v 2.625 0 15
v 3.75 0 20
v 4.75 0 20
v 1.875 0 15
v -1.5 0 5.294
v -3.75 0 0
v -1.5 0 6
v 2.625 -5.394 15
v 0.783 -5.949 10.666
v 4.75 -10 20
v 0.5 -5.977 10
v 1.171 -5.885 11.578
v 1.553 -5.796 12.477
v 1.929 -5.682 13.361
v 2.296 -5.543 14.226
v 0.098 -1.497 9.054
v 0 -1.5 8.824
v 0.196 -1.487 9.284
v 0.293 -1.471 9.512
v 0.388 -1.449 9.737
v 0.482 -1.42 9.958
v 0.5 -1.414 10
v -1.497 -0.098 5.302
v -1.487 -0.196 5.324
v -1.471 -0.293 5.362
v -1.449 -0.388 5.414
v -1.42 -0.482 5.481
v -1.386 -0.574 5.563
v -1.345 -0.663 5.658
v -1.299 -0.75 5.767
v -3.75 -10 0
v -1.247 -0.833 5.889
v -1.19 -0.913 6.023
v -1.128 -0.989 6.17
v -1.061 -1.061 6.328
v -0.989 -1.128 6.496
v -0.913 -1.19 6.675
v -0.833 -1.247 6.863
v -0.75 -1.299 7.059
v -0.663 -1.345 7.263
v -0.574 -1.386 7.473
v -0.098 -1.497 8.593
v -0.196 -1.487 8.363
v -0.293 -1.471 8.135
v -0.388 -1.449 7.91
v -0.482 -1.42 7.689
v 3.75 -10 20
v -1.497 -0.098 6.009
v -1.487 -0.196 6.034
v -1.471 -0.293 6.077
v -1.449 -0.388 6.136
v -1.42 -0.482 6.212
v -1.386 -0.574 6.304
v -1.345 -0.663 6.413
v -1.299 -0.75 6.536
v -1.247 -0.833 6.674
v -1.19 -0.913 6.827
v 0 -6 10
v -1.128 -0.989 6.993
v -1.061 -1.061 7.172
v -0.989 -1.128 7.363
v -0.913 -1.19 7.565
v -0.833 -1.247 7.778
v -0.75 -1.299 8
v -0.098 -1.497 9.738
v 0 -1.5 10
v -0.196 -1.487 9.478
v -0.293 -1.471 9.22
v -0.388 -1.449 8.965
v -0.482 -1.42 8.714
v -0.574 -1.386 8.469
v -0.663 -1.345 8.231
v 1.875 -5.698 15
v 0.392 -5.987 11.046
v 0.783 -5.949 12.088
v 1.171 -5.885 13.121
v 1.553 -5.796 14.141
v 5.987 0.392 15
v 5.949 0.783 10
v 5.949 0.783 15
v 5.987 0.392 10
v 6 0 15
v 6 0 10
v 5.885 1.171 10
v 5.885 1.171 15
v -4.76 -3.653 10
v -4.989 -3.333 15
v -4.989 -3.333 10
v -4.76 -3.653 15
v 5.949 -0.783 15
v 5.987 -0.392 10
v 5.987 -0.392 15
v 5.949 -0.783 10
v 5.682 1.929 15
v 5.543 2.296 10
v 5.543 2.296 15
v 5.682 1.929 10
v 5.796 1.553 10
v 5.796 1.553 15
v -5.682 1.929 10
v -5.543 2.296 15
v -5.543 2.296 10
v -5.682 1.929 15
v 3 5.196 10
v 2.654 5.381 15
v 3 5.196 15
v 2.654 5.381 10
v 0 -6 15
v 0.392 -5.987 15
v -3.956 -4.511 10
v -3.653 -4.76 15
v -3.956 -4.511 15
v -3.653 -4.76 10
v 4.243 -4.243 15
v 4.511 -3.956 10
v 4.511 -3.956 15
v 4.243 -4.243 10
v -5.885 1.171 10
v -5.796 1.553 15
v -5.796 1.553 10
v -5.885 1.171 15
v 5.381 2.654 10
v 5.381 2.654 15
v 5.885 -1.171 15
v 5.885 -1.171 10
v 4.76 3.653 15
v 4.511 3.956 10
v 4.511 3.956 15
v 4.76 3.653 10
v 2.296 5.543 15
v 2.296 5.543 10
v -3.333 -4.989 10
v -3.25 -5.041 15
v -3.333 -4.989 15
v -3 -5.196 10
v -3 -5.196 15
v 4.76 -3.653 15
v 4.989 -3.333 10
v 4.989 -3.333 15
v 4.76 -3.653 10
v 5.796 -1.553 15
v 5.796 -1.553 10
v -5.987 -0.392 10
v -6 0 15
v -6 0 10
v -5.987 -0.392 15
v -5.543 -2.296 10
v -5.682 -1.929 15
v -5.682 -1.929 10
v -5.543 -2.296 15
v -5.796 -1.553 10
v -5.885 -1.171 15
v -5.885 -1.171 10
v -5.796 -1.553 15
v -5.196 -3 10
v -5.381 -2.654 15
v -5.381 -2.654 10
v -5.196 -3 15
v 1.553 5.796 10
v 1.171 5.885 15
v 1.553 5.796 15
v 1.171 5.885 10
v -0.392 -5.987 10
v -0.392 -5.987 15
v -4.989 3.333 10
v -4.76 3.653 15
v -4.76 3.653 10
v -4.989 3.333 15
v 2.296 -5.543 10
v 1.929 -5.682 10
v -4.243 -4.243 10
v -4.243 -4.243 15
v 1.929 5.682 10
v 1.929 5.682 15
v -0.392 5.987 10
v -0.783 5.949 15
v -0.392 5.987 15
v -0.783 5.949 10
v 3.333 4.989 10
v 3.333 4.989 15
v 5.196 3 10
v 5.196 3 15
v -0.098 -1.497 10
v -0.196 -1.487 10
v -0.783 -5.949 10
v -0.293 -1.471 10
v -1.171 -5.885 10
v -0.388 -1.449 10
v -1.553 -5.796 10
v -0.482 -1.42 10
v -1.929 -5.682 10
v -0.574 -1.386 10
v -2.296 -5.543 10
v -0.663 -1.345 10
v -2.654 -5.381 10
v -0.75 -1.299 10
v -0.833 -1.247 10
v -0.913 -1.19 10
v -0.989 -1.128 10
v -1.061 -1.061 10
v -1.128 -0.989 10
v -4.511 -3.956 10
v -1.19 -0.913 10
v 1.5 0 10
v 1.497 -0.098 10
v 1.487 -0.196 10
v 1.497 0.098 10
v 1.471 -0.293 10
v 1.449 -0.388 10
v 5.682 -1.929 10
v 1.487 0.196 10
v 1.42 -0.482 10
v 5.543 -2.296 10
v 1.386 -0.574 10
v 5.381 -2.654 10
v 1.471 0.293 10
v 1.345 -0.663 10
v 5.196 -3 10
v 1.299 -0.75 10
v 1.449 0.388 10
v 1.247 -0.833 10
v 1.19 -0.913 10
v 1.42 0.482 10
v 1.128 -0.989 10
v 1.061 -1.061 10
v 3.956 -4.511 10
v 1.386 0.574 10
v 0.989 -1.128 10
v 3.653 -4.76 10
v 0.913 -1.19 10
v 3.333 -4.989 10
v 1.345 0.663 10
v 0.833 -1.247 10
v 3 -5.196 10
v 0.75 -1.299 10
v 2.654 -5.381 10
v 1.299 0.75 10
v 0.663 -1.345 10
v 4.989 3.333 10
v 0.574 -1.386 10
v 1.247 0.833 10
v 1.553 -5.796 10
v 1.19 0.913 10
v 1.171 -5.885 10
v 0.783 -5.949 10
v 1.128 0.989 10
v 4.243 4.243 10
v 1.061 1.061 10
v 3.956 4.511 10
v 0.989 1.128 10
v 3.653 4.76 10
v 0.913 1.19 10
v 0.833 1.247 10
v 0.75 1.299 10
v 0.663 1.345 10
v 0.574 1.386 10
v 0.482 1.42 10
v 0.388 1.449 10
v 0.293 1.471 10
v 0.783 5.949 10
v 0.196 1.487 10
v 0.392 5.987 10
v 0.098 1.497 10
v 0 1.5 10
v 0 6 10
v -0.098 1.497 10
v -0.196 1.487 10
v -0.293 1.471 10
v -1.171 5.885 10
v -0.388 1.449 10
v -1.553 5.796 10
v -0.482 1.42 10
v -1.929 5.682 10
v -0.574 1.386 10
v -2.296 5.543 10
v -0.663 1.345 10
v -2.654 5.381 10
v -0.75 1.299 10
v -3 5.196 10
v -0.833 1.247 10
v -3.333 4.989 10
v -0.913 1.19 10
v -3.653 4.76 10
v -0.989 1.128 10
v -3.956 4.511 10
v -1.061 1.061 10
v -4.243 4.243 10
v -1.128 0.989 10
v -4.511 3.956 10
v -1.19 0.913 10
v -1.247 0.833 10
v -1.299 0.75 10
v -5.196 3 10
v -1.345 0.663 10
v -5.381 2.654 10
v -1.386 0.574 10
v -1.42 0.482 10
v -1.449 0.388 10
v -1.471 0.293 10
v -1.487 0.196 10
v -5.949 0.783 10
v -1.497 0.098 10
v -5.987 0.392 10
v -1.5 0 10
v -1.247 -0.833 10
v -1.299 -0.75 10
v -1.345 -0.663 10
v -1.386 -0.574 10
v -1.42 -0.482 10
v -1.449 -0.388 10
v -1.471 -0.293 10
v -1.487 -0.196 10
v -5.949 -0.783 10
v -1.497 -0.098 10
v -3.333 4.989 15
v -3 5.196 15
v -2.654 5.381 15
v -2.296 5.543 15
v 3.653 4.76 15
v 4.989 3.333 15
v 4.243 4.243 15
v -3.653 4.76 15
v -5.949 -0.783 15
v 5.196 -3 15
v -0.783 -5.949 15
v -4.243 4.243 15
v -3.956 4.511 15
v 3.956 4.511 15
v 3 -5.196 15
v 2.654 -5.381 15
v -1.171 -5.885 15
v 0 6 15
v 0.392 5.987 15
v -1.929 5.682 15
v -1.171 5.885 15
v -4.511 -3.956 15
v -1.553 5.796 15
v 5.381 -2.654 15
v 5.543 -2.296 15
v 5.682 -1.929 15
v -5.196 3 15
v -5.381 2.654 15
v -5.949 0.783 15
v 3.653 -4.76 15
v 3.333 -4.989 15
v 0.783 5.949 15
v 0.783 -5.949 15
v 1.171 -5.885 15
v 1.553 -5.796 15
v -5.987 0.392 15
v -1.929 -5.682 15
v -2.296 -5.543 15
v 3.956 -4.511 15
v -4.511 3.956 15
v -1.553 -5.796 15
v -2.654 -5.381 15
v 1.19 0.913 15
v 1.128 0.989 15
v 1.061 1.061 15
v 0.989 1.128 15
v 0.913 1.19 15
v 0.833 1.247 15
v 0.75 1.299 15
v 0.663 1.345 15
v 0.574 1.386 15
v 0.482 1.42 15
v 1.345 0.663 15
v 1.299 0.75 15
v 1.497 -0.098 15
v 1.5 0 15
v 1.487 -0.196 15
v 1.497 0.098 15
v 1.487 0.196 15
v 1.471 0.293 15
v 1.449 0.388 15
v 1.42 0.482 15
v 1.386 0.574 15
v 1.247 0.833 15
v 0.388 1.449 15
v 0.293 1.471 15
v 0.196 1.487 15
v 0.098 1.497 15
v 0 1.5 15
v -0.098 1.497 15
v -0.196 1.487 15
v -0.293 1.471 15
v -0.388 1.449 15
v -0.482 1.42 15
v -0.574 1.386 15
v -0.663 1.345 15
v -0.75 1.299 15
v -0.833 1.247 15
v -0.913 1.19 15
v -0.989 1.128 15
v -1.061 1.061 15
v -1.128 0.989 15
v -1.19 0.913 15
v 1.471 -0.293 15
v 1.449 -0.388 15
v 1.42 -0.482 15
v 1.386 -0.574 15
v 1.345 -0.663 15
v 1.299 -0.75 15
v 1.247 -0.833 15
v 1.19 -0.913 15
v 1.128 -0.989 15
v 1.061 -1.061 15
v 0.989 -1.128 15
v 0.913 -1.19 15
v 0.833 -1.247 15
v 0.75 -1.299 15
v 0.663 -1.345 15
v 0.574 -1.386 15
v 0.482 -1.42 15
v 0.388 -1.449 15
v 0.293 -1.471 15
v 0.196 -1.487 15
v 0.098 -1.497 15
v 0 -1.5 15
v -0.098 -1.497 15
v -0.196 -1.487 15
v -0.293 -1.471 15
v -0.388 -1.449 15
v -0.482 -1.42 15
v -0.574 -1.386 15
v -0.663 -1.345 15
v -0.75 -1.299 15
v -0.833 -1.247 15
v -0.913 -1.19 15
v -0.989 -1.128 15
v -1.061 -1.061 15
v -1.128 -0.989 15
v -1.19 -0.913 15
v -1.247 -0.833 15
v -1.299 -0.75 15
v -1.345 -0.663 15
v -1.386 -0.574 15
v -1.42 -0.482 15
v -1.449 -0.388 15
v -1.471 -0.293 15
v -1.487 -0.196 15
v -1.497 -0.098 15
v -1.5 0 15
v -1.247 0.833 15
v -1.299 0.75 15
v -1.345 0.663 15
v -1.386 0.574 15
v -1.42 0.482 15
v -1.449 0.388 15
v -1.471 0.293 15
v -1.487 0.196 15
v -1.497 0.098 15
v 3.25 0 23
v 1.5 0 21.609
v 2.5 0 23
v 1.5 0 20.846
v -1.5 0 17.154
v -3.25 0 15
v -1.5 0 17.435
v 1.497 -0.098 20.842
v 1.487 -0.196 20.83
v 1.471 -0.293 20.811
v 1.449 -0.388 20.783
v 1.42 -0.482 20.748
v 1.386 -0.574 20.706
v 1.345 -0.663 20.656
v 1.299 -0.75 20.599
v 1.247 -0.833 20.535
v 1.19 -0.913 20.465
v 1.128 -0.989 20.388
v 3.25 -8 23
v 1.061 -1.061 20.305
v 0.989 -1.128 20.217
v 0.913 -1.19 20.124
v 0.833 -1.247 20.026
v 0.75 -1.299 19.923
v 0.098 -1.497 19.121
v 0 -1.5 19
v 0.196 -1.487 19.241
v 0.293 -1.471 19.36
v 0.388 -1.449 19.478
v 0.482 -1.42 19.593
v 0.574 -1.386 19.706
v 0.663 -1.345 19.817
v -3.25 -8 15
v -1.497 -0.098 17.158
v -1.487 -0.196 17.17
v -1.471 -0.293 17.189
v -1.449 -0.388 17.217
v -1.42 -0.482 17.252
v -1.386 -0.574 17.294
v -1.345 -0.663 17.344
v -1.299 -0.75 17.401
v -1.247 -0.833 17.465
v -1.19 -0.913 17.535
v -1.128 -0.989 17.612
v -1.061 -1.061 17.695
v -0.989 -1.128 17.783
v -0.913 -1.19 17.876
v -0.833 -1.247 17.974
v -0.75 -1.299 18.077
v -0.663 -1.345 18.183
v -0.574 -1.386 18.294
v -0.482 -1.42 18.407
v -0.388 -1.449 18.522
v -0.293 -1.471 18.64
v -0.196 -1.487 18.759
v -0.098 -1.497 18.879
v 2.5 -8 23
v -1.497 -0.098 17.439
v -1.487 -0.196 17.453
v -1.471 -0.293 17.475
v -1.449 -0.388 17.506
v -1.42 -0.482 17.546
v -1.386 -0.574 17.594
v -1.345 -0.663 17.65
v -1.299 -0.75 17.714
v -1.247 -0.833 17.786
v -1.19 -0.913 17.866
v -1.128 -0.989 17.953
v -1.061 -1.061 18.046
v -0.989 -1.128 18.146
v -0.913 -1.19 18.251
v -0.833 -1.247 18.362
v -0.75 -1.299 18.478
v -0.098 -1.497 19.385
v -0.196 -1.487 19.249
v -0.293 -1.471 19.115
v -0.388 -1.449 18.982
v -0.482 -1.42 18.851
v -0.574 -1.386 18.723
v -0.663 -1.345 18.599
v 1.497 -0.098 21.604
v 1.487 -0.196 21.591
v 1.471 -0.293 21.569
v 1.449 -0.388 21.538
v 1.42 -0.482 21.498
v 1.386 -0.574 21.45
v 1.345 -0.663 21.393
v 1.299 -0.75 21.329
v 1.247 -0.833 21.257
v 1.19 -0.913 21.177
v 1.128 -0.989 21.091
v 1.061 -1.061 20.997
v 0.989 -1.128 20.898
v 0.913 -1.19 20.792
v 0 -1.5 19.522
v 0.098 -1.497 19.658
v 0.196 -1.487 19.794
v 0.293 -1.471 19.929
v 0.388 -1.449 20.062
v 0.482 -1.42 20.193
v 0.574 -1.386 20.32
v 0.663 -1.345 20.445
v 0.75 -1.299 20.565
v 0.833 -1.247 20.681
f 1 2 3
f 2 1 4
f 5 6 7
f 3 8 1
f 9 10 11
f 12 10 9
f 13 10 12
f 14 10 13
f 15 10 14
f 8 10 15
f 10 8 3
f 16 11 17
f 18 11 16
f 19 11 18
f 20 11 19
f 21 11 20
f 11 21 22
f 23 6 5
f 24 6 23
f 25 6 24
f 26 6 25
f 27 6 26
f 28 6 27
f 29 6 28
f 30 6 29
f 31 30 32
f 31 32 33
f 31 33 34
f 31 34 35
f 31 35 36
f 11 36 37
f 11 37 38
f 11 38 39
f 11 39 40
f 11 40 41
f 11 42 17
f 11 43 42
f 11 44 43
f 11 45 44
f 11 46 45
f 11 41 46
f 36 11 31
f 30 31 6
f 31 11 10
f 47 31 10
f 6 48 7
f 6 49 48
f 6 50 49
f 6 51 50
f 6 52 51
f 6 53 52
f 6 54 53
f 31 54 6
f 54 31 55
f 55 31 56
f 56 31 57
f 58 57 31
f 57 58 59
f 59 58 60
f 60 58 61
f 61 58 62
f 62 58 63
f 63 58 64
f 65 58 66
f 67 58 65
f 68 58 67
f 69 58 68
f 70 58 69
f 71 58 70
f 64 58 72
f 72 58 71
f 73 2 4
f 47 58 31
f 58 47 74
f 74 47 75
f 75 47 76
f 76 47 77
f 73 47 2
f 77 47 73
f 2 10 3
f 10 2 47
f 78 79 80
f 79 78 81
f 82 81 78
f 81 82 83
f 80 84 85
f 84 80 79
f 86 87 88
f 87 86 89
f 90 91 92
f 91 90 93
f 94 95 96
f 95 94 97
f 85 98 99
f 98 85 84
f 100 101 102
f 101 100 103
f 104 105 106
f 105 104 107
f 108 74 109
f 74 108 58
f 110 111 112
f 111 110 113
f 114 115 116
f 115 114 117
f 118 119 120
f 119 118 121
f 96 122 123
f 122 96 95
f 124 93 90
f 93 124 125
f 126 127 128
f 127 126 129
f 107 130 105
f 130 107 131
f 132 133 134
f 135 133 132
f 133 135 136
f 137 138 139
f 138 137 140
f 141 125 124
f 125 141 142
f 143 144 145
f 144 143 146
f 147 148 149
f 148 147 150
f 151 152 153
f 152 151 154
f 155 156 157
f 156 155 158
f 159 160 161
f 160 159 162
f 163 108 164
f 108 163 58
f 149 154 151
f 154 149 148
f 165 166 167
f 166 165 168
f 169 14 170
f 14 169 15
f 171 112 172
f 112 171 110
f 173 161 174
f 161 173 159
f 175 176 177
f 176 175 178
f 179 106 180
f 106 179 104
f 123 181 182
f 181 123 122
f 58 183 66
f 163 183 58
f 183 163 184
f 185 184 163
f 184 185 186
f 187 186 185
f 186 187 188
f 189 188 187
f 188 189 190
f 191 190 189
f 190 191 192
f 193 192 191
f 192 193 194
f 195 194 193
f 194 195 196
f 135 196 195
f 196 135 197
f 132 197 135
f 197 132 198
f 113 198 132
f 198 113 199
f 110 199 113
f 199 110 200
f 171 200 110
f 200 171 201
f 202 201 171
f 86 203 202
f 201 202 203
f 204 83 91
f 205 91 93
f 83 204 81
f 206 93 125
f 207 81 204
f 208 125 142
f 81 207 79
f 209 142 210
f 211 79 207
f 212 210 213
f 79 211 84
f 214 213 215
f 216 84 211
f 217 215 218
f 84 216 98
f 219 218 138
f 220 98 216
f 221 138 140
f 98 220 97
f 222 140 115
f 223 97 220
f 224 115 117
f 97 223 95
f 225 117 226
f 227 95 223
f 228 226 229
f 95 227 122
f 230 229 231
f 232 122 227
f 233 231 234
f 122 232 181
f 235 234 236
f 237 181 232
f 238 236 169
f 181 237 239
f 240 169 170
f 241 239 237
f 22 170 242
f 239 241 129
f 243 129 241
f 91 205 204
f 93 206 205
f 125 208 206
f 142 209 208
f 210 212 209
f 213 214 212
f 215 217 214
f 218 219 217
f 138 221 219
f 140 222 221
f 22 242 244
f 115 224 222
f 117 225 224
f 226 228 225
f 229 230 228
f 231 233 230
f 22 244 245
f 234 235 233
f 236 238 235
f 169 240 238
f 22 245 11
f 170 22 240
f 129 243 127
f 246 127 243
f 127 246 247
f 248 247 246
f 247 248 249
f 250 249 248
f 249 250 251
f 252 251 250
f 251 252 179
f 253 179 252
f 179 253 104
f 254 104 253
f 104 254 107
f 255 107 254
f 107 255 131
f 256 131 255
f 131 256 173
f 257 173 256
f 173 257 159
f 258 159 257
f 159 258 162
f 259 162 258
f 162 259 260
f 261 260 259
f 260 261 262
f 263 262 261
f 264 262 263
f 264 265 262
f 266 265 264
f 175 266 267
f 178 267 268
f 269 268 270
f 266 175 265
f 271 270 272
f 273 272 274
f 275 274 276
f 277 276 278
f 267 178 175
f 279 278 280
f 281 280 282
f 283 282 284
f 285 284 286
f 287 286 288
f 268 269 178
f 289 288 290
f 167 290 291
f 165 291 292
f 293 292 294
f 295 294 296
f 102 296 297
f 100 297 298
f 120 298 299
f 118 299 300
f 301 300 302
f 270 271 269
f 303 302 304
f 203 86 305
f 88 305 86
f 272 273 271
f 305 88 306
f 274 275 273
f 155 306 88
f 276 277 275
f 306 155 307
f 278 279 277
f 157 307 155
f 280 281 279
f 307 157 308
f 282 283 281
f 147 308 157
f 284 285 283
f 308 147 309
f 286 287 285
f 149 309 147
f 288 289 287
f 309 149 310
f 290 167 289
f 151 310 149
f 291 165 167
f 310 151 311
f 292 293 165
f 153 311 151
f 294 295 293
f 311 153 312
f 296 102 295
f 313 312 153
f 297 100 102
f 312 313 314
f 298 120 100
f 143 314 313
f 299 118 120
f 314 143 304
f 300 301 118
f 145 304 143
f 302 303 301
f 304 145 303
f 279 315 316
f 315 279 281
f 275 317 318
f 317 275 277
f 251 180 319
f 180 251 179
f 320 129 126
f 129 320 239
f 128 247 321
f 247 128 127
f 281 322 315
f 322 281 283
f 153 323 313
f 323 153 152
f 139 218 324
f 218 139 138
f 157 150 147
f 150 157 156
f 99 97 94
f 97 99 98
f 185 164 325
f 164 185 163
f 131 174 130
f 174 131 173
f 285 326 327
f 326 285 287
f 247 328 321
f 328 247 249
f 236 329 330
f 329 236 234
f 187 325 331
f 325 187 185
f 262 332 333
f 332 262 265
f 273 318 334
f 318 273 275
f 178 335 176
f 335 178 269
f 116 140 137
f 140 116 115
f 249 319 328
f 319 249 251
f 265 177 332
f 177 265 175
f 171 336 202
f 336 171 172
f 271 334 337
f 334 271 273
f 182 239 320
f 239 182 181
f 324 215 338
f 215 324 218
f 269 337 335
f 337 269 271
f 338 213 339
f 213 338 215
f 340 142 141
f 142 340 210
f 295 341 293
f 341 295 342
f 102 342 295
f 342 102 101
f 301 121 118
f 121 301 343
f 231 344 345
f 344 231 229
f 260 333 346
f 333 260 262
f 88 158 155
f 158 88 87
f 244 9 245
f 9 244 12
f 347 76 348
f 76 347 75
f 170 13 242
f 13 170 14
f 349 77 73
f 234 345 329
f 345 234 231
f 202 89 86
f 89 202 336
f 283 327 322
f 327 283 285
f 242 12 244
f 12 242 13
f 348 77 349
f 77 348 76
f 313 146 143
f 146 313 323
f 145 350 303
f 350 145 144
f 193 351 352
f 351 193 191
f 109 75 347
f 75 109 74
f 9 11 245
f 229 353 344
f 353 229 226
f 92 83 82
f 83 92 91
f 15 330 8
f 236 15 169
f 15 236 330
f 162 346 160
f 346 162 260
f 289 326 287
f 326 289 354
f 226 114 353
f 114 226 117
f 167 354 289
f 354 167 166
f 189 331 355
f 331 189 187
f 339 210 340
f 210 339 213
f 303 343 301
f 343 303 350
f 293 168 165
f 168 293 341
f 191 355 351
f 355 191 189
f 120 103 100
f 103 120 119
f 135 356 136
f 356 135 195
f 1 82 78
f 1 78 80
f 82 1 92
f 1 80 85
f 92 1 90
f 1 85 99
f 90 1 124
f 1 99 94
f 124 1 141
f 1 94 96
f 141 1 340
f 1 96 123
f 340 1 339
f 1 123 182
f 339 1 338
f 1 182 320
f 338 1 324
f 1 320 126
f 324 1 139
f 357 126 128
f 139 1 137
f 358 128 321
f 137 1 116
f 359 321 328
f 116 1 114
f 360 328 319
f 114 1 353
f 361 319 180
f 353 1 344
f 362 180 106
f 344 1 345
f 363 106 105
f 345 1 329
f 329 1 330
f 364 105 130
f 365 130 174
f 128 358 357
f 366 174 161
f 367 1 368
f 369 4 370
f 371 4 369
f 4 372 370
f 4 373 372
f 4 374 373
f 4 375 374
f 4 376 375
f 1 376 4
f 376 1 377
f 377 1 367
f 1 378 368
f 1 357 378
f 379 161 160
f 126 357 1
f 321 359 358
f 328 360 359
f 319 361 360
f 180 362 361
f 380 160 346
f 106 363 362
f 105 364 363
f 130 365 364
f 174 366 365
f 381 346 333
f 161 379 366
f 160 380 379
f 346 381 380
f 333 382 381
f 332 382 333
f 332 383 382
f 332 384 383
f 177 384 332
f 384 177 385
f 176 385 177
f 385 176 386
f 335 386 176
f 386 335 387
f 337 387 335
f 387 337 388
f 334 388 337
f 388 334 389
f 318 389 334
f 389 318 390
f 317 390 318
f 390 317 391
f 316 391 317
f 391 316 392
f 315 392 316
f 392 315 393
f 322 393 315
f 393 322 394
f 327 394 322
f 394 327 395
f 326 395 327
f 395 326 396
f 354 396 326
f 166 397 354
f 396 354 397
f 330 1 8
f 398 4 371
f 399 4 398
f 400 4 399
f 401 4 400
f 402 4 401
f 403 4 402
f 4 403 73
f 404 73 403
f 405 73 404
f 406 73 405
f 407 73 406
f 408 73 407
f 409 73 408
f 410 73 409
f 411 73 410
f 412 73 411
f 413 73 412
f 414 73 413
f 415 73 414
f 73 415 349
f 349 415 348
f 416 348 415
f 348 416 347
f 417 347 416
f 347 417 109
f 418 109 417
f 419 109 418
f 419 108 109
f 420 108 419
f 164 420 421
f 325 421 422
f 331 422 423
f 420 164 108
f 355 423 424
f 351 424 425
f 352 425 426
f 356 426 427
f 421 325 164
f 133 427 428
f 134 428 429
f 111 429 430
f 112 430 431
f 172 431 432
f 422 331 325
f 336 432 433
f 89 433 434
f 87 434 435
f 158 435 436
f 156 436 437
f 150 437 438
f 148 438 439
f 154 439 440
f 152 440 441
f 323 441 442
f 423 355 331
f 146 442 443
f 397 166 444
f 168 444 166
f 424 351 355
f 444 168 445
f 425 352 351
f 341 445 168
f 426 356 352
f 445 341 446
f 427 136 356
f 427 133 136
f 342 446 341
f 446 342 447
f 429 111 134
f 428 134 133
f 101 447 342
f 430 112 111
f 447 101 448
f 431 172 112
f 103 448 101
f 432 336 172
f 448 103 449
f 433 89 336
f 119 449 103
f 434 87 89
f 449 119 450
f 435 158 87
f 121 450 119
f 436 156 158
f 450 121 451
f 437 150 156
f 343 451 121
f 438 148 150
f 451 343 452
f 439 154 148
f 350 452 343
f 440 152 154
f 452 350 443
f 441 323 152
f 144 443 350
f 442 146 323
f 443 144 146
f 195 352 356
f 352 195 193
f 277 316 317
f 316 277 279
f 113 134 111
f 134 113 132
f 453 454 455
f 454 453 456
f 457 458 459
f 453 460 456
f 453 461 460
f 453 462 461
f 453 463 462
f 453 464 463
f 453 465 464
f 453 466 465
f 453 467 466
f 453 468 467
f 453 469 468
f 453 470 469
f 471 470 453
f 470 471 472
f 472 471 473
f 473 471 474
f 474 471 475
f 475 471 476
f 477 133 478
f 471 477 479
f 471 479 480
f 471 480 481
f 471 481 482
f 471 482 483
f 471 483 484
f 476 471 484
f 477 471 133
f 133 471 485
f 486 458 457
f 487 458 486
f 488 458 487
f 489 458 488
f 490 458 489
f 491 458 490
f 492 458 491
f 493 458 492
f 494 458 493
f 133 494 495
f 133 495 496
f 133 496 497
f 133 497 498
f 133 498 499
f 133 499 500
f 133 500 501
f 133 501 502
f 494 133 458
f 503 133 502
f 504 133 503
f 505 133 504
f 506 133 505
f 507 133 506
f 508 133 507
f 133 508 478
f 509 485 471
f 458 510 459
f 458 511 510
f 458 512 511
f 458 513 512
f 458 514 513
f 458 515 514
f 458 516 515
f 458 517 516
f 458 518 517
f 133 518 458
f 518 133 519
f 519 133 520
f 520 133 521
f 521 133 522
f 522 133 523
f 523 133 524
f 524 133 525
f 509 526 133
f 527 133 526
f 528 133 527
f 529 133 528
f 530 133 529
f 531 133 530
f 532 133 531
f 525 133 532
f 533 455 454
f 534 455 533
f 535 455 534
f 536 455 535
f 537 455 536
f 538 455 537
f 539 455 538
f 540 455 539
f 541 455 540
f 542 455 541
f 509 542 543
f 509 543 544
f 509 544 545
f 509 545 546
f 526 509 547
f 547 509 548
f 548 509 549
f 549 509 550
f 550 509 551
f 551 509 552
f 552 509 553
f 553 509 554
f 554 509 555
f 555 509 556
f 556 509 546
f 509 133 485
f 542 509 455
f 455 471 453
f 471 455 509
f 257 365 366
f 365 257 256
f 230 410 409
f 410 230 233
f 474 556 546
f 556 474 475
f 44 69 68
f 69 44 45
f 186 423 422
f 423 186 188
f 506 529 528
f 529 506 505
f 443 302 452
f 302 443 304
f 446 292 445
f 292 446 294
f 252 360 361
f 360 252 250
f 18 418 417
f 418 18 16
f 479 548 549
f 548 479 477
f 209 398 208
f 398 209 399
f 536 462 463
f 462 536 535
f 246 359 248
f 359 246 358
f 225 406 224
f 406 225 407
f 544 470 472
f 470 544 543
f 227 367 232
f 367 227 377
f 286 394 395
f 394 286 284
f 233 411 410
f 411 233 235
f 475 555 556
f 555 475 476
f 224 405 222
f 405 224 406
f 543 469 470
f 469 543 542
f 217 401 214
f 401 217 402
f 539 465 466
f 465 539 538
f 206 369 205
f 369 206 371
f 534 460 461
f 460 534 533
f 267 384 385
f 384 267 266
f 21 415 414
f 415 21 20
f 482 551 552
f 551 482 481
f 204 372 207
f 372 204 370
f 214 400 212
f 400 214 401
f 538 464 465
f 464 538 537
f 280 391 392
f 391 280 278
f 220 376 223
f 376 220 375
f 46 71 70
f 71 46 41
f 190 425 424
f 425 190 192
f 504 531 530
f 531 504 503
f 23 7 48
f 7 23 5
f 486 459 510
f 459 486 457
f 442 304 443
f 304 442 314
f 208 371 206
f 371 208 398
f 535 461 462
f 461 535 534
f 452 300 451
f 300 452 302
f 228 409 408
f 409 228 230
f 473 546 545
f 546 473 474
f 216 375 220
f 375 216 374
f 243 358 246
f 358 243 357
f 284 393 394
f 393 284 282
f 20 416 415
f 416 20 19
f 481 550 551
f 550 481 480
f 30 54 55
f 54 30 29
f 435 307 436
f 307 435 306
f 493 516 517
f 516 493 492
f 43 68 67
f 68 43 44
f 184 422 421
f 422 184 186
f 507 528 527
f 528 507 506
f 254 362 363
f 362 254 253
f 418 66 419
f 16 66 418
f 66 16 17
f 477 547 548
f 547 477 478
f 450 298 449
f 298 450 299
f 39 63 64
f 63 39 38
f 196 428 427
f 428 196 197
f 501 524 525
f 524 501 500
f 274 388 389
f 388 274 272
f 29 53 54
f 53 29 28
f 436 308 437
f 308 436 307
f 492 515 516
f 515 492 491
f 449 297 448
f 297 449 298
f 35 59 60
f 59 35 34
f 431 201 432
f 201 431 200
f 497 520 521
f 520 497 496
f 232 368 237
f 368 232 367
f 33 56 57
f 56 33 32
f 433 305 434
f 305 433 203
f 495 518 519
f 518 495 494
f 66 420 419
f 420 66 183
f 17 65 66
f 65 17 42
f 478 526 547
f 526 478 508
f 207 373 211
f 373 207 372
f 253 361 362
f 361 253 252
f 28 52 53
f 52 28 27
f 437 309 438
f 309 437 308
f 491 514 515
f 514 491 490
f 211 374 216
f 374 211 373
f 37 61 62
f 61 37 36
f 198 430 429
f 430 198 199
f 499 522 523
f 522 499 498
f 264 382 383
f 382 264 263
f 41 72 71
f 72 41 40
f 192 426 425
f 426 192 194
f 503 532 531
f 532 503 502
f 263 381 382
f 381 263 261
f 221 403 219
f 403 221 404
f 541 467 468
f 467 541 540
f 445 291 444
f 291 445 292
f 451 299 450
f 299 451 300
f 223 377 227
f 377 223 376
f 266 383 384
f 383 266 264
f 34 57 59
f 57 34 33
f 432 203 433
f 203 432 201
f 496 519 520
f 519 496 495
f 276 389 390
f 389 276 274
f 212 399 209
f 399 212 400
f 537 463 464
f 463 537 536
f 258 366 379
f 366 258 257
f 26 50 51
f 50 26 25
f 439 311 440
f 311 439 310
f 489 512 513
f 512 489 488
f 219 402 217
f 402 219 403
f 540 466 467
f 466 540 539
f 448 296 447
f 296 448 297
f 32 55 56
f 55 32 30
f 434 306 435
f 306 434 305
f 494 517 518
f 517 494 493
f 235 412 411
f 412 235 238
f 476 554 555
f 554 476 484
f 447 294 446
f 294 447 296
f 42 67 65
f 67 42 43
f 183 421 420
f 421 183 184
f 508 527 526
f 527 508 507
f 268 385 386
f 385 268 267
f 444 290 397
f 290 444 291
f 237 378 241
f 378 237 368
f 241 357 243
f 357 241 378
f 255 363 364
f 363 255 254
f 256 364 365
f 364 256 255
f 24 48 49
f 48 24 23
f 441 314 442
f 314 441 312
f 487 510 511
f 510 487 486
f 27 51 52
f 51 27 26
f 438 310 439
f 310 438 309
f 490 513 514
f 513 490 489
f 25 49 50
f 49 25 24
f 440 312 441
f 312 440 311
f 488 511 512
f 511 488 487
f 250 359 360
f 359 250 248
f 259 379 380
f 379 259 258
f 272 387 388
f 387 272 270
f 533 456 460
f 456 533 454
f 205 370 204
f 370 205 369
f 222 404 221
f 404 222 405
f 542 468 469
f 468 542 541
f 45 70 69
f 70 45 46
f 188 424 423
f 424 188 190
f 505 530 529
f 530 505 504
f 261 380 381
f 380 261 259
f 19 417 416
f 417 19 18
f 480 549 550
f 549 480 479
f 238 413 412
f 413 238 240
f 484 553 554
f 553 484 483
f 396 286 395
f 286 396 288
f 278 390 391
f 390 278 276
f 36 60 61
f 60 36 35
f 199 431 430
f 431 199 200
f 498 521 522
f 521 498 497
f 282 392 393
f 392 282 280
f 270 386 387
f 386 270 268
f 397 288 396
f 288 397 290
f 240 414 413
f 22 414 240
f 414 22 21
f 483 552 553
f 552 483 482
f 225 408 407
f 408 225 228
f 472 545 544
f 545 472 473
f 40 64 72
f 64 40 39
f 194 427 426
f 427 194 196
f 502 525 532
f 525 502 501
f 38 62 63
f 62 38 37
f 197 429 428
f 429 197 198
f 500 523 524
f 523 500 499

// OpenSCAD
// Hose-barb reducer: 8 mm OD barb (z = 0..20) to 5 mm OD barb (z = 25..41)
// Print orientation: standing upright along +Z
// Units: mm

// ---------------- Parameters ----------------
bore          = 3;    // through-bore diameter (full length)

// 8 mm tubing barb (lower section)
barb_8_h      = 10;   // barb height
barb_8_od_bot = 7.5;  // outer diameter at bottom (z = 0)
barb_8_od_top = 9.5;  // outer diameter at top (z = 20)

// Collar (transition between sections)
collar_od     = 12;   // collar diameter
collar_h      = 5;    // collar height (z = 20..25)

// 5 mm tubing barb (upper section)
barb_5_h      = 8;    // barb height
barb_5_od_bot = 6.5;  // outer diameter at bottom (z = 25)
barb_5_od_top = 5.0;  // outer diameter at top (z = 41)

eps           = 0.5;  // overlap / extension for clean booleans
$fn           = 96;   // curve resolution

// ---------------- Derived ----------------
z0      = 0;                    // start of 8 mm barb
z20     = z0 + barb_8_h;        // top of 8 mm barb
z25     = z20 + collar_h;       // top of collar
z41     = z25 + barb_5_h;       // top of 5 mm barb
length  = z41 - z0;             // overall length

// ---------------- Model ----------------
difference() {
    union() {
        // 8 mm barb: sawtooth profile in XZ, extruded along Y (rotationally symmetric)
        // Profile: (r=barb_8_od_bot/2, z=0) -> (r=barb_8_od_top/2, z=20) -> (r=barb_8_od_bot/2, z=20)
        rotate([90, 0, 0])
            linear_extrude(height = barb_8_h)
                polygon(points = [
                    [-barb_8_od_bot / 2, 0],
                    [ barb_8_od_top / 2, 20],
                    [ barb_8_od_bot / 2, 20]
                ]);

        // Cylindrical collar
        translate([0, 0, z20])
            cylinder(d = collar_od, h = collar_h);

        // 5 mm barb: cone shape, then a step back out to the same diameter (zero-height flare)
        // Profile: (r=barb_5_od_bot/2, z=25) -> (r=barb_5_od_top/2, z=41) -> (r=barb_5_od_bot/2, z=41)
        rotate([90, 0, 0])
            linear_extrude(height = barb_5_h)
                polygon(points = [
                    [-barb_5_od_bot / 2, z25],
                    [ barb_5_od_top / 2, z41],
                    [ barb_5_od_bot / 2, z41]
                ]);
    }

    // Through-bore along Z
    translate([0, 0, -eps])
        cylinder(d = bore, h = length + 2 * eps);
}
